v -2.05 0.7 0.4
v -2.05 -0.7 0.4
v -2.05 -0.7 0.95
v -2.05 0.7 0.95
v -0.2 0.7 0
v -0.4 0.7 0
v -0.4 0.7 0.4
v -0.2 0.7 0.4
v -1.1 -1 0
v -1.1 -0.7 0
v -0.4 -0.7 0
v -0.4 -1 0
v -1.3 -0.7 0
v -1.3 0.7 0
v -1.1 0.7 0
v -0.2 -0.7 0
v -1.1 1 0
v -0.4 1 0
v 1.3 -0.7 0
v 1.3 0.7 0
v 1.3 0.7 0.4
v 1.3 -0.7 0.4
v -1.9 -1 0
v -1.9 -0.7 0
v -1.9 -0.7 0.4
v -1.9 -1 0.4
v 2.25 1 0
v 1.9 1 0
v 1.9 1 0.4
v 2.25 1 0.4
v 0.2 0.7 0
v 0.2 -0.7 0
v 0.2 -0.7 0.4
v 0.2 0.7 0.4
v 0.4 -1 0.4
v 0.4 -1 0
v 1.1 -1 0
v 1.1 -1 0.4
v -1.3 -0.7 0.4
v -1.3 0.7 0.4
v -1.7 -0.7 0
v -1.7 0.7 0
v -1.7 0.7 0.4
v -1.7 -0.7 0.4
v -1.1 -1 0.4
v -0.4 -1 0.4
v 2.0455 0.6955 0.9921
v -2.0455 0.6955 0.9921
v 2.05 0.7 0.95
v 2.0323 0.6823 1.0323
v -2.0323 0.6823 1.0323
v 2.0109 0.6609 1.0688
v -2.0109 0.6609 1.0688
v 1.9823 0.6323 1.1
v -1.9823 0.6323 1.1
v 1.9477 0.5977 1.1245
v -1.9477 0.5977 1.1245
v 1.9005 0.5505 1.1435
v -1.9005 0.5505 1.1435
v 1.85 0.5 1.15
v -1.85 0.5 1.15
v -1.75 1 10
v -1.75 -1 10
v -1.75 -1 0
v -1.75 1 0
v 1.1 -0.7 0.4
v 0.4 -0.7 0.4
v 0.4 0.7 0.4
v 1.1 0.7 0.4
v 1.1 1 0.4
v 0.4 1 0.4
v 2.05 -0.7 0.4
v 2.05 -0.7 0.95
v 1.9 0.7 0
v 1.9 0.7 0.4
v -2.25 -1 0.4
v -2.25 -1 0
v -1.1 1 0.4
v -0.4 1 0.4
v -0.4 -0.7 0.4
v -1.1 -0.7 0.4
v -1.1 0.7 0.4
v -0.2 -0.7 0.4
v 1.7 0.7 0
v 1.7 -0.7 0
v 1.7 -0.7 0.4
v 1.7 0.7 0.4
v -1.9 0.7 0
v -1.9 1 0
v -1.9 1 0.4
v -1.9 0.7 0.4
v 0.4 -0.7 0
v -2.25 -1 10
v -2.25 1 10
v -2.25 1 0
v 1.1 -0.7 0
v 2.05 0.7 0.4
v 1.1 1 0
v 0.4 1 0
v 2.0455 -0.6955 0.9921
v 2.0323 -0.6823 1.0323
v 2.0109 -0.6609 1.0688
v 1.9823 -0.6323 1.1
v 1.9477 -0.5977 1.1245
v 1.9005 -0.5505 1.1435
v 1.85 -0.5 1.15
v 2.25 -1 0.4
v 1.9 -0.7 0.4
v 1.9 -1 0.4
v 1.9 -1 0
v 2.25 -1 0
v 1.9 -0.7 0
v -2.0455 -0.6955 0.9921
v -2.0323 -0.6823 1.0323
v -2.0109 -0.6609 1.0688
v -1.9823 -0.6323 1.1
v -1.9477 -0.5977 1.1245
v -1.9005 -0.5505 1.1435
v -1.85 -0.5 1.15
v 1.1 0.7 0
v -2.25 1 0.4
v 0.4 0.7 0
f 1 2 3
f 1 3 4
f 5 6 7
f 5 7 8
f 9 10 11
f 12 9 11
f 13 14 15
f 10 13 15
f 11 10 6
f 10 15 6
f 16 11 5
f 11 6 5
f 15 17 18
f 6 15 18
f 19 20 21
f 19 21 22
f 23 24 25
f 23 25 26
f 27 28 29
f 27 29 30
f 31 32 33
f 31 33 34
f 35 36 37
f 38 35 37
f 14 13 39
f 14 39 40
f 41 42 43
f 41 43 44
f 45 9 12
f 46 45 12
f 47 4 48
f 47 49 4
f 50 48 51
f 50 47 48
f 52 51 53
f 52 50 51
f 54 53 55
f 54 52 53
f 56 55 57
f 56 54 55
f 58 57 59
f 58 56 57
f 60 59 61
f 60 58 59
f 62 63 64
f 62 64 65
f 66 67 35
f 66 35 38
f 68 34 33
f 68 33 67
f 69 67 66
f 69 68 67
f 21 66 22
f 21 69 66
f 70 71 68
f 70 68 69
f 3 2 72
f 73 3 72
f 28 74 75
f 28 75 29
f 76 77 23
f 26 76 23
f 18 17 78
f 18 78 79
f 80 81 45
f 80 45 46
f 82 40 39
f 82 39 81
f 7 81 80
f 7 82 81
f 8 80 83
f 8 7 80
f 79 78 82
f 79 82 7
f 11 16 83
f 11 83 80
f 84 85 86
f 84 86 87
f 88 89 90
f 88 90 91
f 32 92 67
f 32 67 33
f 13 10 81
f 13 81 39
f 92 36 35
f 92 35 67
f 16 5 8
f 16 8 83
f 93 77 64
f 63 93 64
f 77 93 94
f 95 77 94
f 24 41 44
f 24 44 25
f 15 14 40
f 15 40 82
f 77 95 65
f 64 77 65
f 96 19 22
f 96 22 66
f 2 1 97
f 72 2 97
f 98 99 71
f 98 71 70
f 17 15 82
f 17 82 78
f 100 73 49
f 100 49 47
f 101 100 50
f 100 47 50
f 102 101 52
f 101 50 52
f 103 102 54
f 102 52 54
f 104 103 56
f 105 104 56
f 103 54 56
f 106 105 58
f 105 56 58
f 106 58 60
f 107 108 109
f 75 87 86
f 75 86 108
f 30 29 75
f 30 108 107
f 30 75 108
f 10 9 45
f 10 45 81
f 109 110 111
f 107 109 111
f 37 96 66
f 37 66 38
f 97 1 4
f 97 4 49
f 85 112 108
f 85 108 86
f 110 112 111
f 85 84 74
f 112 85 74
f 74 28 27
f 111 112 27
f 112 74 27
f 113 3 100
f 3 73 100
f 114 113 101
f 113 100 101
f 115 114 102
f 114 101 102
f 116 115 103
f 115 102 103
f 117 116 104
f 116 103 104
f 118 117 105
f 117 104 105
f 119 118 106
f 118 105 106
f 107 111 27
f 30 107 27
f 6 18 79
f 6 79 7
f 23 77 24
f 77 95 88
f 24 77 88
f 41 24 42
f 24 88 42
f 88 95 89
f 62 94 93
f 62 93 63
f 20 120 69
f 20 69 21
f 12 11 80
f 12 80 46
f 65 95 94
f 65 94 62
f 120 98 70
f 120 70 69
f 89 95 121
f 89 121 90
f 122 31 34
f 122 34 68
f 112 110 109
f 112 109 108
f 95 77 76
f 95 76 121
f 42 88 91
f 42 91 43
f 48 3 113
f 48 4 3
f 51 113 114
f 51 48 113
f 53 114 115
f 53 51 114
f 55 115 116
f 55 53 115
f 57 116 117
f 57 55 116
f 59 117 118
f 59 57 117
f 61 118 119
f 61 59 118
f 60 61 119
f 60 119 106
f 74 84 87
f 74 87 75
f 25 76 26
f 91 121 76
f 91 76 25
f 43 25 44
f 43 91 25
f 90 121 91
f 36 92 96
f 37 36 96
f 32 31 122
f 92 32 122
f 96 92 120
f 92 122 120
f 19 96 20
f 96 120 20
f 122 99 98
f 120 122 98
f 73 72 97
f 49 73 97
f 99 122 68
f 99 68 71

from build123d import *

# Parameters (mm, degrees)
SKETCH003_W      = 4.1
SKETCH003_H      = 1.4
EXTRUDE003_DEPTH = 0.75
FILLET_R         = 0.2
BOX001_W         = 0.5
BOX001_H         = 2
BOX001_DEPTH     = 10
SKETCH004_W      = 0.5
SKETCH004_H      = 0.25
EXTRUDE004_DEPTH = 0.4
EXTRUDE_DEPTH    = 0.4
EXTRUDE001_DEPTH = 0.4
EXTRUDE002_DEPTH = 0.4
BOX_W            = 4.5
BOX_H            = 2
BOX_DEPTH        = 0.4


with BuildPart() as lid:
    # Sketch003 → Extrude003 (new body)
    with BuildSketch(Plane.XY):
        Rectangle(SKETCH003_W, SKETCH003_H)
    extrude(amount=EXTRUDE003_DEPTH)


with BuildPart() as lid_1:
    # Extrude003 placement: moved
    add(lid.part.moved(Location((0, 0, 0.4))))

    # Fillet
    fillet_edges = [lid_1.edges().sort_by_distance(p)[0] for p in [
        (0, 0.7, 1.15),
        (2.05, 0, 1.15),
        (0, -0.7, 1.15),
        (-2.05, 0, 1.15),
    ]]
    fillet(fillet_edges, radius=FILLET_R)


with BuildPart() as cube:
    # Box001 → Box001 (new body)
    with BuildSketch(Plane(origin=(-2.25, -1, 0), x_dir=(1, 0, 0), z_dir=(0, 0, 1))):
        with Locations((0.25, 1)):
            Rectangle(BOX001_W, BOX001_H)
    extrude(amount=BOX001_DEPTH)


with BuildPart() as delete_holes:
    # Sketch004 (on Cut) → Extrude004 (new body)
    with BuildSketch(Plane.XY):
        with Locations((-1.52, -0.905)):
            Rectangle(SKETCH004_W, SKETCH004_H)
        with Locations((-1.52, 0.905)):
            Rectangle(SKETCH004_W, SKETCH004_H)
        with Locations((0, 0.895)):
            Rectangle(SKETCH004_W, SKETCH004_H)
        with Locations((0, -0.895)):
            Rectangle(SKETCH004_W, SKETCH004_H)
        with Locations((1.52, -0.905)):
            Rectangle(SKETCH004_W, SKETCH004_H)
        with Locations((1.52, 0.905)):
            Rectangle(SKETCH004_W, SKETCH004_H)
    extrude(amount=EXTRUDE004_DEPTH)


with BuildPart() as pad2:
    # Sketch → Extrude (new body)
    with BuildSketch(Plane.XY):
        with BuildLine():
            Line((-0.2, 0.7), (-0.2, -0.7))
            Line((-0.2, -0.7), (-0.4, -0.7))
            Line((-0.4, -0.7), (-0.4, -1))
            Line((-0.4, -1), (-0.2, -1))
            ThreePointArc((0.2, -1), (0, -0.8), (-0.2, -1))
            Line((0.2, -1), (0.4, -1))
            Line((0.4, -1), (0.4, -0.7))
            Line((0.4, -0.7), (0.2, -0.7))
            Line((0.2, -0.7), (0.2, 0.7))
            Line((0.2, 0.7), (0.4, 0.7))
            Line((0.4, 0.7), (0.4, 1))
            Line((0.4, 1), (0.2, 1))
            ThreePointArc((-0.2, 1), (0, 0.8), (0.2, 1))
            Line((-0.2, 1), (-0.4, 1))
            Line((-0.4, 1), (-0.4, 0.7))
            Line((-0.4, 0.7), (-0.2, 0.7))
        make_face()
    extrude(amount=EXTRUDE_DEPTH)


with BuildPart() as pad1:
    # Sketch001 → Extrude001 (new body)
    with BuildSketch(Plane(origin=(1.5, 0, 0), x_dir=(1, 0, 0), z_dir=(0, 0, 1))):
        with BuildLine():
            Line((-0.2, 0.7), (-0.2, -0.7))
            Line((-0.2, -0.7), (-0.4, -0.7))
            Line((-0.4, -0.7), (-0.4, -1))
            Line((-0.4, -1), (-0.2, -1))
            ThreePointArc((0.2, -1), (0, -0.8), (-0.2, -1))
            Line((0.2, -1), (0.4, -1))
            Line((0.4, -1), (0.4, -0.7))
            Line((0.4, -0.7), (0.2, -0.7))
            Line((0.2, -0.7), (0.2, 0.7))
            Line((0.2, 0.7), (0.4, 0.7))
            Line((0.4, 0.7), (0.4, 1))
            Line((0.4, 1), (0.2, 1))
            ThreePointArc((-0.2, 1), (0, 0.8), (0.2, 1))
            Line((-0.2, 1), (-0.4, 1))
            Line((-0.4, 1), (-0.4, 0.7))
            Line((-0.4, 0.7), (-0.2, 0.7))
        make_face()
    extrude(amount=EXTRUDE001_DEPTH)


with BuildPart() as pads:
    # Sketch002 → Extrude002 (new body)
    with BuildSketch(Plane(origin=(-1.5, 0, 0), x_dir=(1, 0, 0), z_dir=(0, 0, 1))):
        with BuildLine():
            Line((-0.2, 0.7), (-0.2, -0.7))
            Line((-0.2, -0.7), (-0.4, -0.7))
            Line((-0.4, -0.7), (-0.4, -1))
            Line((-0.4, -1), (-0.2, -1))
            ThreePointArc((0.2, -1), (0, -0.8), (-0.2, -1))
            Line((0.2, -1), (0.4, -1))
            Line((0.4, -1), (0.4, -0.7))
            Line((0.4, -0.7), (0.2, -0.7))
            Line((0.2, -0.7), (0.2, 0.7))
            Line((0.2, 0.7), (0.4, 0.7))
            Line((0.4, 0.7), (0.4, 1))
            Line((0.4, 1), (0.2, 1))
            ThreePointArc((-0.2, 1), (0, 0.8), (0.2, 1))
            Line((-0.2, 1), (-0.4, 1))
            Line((-0.4, 1), (-0.4, 0.7))
            Line((-0.4, 0.7), (-0.2, 0.7))
        make_face()
    extrude(amount=EXTRUDE002_DEPTH)

    # Fusion: union pad2, pad1
    add(pad2.part)
    add(pad1.part)


with BuildPart() as base_cut2:
    # Box → Box (new body)
    with BuildSketch(Plane(origin=(-2.25, -1, 0), x_dir=(1, 0, 0), z_dir=(0, 0, 1))):
        with Locations((2.25, 1)):
            Rectangle(BOX_W, BOX_H)
    extrude(amount=BOX_DEPTH)

    # Cut: cut pads
    add(pads.part, mode=Mode.SUBTRACT)

    # Cut001: cut delete_holes
    add(delete_holes.part, mode=Mode.SUBTRACT)


solid = Compound([lid_1.part, cube.part, base_cut2.part])
